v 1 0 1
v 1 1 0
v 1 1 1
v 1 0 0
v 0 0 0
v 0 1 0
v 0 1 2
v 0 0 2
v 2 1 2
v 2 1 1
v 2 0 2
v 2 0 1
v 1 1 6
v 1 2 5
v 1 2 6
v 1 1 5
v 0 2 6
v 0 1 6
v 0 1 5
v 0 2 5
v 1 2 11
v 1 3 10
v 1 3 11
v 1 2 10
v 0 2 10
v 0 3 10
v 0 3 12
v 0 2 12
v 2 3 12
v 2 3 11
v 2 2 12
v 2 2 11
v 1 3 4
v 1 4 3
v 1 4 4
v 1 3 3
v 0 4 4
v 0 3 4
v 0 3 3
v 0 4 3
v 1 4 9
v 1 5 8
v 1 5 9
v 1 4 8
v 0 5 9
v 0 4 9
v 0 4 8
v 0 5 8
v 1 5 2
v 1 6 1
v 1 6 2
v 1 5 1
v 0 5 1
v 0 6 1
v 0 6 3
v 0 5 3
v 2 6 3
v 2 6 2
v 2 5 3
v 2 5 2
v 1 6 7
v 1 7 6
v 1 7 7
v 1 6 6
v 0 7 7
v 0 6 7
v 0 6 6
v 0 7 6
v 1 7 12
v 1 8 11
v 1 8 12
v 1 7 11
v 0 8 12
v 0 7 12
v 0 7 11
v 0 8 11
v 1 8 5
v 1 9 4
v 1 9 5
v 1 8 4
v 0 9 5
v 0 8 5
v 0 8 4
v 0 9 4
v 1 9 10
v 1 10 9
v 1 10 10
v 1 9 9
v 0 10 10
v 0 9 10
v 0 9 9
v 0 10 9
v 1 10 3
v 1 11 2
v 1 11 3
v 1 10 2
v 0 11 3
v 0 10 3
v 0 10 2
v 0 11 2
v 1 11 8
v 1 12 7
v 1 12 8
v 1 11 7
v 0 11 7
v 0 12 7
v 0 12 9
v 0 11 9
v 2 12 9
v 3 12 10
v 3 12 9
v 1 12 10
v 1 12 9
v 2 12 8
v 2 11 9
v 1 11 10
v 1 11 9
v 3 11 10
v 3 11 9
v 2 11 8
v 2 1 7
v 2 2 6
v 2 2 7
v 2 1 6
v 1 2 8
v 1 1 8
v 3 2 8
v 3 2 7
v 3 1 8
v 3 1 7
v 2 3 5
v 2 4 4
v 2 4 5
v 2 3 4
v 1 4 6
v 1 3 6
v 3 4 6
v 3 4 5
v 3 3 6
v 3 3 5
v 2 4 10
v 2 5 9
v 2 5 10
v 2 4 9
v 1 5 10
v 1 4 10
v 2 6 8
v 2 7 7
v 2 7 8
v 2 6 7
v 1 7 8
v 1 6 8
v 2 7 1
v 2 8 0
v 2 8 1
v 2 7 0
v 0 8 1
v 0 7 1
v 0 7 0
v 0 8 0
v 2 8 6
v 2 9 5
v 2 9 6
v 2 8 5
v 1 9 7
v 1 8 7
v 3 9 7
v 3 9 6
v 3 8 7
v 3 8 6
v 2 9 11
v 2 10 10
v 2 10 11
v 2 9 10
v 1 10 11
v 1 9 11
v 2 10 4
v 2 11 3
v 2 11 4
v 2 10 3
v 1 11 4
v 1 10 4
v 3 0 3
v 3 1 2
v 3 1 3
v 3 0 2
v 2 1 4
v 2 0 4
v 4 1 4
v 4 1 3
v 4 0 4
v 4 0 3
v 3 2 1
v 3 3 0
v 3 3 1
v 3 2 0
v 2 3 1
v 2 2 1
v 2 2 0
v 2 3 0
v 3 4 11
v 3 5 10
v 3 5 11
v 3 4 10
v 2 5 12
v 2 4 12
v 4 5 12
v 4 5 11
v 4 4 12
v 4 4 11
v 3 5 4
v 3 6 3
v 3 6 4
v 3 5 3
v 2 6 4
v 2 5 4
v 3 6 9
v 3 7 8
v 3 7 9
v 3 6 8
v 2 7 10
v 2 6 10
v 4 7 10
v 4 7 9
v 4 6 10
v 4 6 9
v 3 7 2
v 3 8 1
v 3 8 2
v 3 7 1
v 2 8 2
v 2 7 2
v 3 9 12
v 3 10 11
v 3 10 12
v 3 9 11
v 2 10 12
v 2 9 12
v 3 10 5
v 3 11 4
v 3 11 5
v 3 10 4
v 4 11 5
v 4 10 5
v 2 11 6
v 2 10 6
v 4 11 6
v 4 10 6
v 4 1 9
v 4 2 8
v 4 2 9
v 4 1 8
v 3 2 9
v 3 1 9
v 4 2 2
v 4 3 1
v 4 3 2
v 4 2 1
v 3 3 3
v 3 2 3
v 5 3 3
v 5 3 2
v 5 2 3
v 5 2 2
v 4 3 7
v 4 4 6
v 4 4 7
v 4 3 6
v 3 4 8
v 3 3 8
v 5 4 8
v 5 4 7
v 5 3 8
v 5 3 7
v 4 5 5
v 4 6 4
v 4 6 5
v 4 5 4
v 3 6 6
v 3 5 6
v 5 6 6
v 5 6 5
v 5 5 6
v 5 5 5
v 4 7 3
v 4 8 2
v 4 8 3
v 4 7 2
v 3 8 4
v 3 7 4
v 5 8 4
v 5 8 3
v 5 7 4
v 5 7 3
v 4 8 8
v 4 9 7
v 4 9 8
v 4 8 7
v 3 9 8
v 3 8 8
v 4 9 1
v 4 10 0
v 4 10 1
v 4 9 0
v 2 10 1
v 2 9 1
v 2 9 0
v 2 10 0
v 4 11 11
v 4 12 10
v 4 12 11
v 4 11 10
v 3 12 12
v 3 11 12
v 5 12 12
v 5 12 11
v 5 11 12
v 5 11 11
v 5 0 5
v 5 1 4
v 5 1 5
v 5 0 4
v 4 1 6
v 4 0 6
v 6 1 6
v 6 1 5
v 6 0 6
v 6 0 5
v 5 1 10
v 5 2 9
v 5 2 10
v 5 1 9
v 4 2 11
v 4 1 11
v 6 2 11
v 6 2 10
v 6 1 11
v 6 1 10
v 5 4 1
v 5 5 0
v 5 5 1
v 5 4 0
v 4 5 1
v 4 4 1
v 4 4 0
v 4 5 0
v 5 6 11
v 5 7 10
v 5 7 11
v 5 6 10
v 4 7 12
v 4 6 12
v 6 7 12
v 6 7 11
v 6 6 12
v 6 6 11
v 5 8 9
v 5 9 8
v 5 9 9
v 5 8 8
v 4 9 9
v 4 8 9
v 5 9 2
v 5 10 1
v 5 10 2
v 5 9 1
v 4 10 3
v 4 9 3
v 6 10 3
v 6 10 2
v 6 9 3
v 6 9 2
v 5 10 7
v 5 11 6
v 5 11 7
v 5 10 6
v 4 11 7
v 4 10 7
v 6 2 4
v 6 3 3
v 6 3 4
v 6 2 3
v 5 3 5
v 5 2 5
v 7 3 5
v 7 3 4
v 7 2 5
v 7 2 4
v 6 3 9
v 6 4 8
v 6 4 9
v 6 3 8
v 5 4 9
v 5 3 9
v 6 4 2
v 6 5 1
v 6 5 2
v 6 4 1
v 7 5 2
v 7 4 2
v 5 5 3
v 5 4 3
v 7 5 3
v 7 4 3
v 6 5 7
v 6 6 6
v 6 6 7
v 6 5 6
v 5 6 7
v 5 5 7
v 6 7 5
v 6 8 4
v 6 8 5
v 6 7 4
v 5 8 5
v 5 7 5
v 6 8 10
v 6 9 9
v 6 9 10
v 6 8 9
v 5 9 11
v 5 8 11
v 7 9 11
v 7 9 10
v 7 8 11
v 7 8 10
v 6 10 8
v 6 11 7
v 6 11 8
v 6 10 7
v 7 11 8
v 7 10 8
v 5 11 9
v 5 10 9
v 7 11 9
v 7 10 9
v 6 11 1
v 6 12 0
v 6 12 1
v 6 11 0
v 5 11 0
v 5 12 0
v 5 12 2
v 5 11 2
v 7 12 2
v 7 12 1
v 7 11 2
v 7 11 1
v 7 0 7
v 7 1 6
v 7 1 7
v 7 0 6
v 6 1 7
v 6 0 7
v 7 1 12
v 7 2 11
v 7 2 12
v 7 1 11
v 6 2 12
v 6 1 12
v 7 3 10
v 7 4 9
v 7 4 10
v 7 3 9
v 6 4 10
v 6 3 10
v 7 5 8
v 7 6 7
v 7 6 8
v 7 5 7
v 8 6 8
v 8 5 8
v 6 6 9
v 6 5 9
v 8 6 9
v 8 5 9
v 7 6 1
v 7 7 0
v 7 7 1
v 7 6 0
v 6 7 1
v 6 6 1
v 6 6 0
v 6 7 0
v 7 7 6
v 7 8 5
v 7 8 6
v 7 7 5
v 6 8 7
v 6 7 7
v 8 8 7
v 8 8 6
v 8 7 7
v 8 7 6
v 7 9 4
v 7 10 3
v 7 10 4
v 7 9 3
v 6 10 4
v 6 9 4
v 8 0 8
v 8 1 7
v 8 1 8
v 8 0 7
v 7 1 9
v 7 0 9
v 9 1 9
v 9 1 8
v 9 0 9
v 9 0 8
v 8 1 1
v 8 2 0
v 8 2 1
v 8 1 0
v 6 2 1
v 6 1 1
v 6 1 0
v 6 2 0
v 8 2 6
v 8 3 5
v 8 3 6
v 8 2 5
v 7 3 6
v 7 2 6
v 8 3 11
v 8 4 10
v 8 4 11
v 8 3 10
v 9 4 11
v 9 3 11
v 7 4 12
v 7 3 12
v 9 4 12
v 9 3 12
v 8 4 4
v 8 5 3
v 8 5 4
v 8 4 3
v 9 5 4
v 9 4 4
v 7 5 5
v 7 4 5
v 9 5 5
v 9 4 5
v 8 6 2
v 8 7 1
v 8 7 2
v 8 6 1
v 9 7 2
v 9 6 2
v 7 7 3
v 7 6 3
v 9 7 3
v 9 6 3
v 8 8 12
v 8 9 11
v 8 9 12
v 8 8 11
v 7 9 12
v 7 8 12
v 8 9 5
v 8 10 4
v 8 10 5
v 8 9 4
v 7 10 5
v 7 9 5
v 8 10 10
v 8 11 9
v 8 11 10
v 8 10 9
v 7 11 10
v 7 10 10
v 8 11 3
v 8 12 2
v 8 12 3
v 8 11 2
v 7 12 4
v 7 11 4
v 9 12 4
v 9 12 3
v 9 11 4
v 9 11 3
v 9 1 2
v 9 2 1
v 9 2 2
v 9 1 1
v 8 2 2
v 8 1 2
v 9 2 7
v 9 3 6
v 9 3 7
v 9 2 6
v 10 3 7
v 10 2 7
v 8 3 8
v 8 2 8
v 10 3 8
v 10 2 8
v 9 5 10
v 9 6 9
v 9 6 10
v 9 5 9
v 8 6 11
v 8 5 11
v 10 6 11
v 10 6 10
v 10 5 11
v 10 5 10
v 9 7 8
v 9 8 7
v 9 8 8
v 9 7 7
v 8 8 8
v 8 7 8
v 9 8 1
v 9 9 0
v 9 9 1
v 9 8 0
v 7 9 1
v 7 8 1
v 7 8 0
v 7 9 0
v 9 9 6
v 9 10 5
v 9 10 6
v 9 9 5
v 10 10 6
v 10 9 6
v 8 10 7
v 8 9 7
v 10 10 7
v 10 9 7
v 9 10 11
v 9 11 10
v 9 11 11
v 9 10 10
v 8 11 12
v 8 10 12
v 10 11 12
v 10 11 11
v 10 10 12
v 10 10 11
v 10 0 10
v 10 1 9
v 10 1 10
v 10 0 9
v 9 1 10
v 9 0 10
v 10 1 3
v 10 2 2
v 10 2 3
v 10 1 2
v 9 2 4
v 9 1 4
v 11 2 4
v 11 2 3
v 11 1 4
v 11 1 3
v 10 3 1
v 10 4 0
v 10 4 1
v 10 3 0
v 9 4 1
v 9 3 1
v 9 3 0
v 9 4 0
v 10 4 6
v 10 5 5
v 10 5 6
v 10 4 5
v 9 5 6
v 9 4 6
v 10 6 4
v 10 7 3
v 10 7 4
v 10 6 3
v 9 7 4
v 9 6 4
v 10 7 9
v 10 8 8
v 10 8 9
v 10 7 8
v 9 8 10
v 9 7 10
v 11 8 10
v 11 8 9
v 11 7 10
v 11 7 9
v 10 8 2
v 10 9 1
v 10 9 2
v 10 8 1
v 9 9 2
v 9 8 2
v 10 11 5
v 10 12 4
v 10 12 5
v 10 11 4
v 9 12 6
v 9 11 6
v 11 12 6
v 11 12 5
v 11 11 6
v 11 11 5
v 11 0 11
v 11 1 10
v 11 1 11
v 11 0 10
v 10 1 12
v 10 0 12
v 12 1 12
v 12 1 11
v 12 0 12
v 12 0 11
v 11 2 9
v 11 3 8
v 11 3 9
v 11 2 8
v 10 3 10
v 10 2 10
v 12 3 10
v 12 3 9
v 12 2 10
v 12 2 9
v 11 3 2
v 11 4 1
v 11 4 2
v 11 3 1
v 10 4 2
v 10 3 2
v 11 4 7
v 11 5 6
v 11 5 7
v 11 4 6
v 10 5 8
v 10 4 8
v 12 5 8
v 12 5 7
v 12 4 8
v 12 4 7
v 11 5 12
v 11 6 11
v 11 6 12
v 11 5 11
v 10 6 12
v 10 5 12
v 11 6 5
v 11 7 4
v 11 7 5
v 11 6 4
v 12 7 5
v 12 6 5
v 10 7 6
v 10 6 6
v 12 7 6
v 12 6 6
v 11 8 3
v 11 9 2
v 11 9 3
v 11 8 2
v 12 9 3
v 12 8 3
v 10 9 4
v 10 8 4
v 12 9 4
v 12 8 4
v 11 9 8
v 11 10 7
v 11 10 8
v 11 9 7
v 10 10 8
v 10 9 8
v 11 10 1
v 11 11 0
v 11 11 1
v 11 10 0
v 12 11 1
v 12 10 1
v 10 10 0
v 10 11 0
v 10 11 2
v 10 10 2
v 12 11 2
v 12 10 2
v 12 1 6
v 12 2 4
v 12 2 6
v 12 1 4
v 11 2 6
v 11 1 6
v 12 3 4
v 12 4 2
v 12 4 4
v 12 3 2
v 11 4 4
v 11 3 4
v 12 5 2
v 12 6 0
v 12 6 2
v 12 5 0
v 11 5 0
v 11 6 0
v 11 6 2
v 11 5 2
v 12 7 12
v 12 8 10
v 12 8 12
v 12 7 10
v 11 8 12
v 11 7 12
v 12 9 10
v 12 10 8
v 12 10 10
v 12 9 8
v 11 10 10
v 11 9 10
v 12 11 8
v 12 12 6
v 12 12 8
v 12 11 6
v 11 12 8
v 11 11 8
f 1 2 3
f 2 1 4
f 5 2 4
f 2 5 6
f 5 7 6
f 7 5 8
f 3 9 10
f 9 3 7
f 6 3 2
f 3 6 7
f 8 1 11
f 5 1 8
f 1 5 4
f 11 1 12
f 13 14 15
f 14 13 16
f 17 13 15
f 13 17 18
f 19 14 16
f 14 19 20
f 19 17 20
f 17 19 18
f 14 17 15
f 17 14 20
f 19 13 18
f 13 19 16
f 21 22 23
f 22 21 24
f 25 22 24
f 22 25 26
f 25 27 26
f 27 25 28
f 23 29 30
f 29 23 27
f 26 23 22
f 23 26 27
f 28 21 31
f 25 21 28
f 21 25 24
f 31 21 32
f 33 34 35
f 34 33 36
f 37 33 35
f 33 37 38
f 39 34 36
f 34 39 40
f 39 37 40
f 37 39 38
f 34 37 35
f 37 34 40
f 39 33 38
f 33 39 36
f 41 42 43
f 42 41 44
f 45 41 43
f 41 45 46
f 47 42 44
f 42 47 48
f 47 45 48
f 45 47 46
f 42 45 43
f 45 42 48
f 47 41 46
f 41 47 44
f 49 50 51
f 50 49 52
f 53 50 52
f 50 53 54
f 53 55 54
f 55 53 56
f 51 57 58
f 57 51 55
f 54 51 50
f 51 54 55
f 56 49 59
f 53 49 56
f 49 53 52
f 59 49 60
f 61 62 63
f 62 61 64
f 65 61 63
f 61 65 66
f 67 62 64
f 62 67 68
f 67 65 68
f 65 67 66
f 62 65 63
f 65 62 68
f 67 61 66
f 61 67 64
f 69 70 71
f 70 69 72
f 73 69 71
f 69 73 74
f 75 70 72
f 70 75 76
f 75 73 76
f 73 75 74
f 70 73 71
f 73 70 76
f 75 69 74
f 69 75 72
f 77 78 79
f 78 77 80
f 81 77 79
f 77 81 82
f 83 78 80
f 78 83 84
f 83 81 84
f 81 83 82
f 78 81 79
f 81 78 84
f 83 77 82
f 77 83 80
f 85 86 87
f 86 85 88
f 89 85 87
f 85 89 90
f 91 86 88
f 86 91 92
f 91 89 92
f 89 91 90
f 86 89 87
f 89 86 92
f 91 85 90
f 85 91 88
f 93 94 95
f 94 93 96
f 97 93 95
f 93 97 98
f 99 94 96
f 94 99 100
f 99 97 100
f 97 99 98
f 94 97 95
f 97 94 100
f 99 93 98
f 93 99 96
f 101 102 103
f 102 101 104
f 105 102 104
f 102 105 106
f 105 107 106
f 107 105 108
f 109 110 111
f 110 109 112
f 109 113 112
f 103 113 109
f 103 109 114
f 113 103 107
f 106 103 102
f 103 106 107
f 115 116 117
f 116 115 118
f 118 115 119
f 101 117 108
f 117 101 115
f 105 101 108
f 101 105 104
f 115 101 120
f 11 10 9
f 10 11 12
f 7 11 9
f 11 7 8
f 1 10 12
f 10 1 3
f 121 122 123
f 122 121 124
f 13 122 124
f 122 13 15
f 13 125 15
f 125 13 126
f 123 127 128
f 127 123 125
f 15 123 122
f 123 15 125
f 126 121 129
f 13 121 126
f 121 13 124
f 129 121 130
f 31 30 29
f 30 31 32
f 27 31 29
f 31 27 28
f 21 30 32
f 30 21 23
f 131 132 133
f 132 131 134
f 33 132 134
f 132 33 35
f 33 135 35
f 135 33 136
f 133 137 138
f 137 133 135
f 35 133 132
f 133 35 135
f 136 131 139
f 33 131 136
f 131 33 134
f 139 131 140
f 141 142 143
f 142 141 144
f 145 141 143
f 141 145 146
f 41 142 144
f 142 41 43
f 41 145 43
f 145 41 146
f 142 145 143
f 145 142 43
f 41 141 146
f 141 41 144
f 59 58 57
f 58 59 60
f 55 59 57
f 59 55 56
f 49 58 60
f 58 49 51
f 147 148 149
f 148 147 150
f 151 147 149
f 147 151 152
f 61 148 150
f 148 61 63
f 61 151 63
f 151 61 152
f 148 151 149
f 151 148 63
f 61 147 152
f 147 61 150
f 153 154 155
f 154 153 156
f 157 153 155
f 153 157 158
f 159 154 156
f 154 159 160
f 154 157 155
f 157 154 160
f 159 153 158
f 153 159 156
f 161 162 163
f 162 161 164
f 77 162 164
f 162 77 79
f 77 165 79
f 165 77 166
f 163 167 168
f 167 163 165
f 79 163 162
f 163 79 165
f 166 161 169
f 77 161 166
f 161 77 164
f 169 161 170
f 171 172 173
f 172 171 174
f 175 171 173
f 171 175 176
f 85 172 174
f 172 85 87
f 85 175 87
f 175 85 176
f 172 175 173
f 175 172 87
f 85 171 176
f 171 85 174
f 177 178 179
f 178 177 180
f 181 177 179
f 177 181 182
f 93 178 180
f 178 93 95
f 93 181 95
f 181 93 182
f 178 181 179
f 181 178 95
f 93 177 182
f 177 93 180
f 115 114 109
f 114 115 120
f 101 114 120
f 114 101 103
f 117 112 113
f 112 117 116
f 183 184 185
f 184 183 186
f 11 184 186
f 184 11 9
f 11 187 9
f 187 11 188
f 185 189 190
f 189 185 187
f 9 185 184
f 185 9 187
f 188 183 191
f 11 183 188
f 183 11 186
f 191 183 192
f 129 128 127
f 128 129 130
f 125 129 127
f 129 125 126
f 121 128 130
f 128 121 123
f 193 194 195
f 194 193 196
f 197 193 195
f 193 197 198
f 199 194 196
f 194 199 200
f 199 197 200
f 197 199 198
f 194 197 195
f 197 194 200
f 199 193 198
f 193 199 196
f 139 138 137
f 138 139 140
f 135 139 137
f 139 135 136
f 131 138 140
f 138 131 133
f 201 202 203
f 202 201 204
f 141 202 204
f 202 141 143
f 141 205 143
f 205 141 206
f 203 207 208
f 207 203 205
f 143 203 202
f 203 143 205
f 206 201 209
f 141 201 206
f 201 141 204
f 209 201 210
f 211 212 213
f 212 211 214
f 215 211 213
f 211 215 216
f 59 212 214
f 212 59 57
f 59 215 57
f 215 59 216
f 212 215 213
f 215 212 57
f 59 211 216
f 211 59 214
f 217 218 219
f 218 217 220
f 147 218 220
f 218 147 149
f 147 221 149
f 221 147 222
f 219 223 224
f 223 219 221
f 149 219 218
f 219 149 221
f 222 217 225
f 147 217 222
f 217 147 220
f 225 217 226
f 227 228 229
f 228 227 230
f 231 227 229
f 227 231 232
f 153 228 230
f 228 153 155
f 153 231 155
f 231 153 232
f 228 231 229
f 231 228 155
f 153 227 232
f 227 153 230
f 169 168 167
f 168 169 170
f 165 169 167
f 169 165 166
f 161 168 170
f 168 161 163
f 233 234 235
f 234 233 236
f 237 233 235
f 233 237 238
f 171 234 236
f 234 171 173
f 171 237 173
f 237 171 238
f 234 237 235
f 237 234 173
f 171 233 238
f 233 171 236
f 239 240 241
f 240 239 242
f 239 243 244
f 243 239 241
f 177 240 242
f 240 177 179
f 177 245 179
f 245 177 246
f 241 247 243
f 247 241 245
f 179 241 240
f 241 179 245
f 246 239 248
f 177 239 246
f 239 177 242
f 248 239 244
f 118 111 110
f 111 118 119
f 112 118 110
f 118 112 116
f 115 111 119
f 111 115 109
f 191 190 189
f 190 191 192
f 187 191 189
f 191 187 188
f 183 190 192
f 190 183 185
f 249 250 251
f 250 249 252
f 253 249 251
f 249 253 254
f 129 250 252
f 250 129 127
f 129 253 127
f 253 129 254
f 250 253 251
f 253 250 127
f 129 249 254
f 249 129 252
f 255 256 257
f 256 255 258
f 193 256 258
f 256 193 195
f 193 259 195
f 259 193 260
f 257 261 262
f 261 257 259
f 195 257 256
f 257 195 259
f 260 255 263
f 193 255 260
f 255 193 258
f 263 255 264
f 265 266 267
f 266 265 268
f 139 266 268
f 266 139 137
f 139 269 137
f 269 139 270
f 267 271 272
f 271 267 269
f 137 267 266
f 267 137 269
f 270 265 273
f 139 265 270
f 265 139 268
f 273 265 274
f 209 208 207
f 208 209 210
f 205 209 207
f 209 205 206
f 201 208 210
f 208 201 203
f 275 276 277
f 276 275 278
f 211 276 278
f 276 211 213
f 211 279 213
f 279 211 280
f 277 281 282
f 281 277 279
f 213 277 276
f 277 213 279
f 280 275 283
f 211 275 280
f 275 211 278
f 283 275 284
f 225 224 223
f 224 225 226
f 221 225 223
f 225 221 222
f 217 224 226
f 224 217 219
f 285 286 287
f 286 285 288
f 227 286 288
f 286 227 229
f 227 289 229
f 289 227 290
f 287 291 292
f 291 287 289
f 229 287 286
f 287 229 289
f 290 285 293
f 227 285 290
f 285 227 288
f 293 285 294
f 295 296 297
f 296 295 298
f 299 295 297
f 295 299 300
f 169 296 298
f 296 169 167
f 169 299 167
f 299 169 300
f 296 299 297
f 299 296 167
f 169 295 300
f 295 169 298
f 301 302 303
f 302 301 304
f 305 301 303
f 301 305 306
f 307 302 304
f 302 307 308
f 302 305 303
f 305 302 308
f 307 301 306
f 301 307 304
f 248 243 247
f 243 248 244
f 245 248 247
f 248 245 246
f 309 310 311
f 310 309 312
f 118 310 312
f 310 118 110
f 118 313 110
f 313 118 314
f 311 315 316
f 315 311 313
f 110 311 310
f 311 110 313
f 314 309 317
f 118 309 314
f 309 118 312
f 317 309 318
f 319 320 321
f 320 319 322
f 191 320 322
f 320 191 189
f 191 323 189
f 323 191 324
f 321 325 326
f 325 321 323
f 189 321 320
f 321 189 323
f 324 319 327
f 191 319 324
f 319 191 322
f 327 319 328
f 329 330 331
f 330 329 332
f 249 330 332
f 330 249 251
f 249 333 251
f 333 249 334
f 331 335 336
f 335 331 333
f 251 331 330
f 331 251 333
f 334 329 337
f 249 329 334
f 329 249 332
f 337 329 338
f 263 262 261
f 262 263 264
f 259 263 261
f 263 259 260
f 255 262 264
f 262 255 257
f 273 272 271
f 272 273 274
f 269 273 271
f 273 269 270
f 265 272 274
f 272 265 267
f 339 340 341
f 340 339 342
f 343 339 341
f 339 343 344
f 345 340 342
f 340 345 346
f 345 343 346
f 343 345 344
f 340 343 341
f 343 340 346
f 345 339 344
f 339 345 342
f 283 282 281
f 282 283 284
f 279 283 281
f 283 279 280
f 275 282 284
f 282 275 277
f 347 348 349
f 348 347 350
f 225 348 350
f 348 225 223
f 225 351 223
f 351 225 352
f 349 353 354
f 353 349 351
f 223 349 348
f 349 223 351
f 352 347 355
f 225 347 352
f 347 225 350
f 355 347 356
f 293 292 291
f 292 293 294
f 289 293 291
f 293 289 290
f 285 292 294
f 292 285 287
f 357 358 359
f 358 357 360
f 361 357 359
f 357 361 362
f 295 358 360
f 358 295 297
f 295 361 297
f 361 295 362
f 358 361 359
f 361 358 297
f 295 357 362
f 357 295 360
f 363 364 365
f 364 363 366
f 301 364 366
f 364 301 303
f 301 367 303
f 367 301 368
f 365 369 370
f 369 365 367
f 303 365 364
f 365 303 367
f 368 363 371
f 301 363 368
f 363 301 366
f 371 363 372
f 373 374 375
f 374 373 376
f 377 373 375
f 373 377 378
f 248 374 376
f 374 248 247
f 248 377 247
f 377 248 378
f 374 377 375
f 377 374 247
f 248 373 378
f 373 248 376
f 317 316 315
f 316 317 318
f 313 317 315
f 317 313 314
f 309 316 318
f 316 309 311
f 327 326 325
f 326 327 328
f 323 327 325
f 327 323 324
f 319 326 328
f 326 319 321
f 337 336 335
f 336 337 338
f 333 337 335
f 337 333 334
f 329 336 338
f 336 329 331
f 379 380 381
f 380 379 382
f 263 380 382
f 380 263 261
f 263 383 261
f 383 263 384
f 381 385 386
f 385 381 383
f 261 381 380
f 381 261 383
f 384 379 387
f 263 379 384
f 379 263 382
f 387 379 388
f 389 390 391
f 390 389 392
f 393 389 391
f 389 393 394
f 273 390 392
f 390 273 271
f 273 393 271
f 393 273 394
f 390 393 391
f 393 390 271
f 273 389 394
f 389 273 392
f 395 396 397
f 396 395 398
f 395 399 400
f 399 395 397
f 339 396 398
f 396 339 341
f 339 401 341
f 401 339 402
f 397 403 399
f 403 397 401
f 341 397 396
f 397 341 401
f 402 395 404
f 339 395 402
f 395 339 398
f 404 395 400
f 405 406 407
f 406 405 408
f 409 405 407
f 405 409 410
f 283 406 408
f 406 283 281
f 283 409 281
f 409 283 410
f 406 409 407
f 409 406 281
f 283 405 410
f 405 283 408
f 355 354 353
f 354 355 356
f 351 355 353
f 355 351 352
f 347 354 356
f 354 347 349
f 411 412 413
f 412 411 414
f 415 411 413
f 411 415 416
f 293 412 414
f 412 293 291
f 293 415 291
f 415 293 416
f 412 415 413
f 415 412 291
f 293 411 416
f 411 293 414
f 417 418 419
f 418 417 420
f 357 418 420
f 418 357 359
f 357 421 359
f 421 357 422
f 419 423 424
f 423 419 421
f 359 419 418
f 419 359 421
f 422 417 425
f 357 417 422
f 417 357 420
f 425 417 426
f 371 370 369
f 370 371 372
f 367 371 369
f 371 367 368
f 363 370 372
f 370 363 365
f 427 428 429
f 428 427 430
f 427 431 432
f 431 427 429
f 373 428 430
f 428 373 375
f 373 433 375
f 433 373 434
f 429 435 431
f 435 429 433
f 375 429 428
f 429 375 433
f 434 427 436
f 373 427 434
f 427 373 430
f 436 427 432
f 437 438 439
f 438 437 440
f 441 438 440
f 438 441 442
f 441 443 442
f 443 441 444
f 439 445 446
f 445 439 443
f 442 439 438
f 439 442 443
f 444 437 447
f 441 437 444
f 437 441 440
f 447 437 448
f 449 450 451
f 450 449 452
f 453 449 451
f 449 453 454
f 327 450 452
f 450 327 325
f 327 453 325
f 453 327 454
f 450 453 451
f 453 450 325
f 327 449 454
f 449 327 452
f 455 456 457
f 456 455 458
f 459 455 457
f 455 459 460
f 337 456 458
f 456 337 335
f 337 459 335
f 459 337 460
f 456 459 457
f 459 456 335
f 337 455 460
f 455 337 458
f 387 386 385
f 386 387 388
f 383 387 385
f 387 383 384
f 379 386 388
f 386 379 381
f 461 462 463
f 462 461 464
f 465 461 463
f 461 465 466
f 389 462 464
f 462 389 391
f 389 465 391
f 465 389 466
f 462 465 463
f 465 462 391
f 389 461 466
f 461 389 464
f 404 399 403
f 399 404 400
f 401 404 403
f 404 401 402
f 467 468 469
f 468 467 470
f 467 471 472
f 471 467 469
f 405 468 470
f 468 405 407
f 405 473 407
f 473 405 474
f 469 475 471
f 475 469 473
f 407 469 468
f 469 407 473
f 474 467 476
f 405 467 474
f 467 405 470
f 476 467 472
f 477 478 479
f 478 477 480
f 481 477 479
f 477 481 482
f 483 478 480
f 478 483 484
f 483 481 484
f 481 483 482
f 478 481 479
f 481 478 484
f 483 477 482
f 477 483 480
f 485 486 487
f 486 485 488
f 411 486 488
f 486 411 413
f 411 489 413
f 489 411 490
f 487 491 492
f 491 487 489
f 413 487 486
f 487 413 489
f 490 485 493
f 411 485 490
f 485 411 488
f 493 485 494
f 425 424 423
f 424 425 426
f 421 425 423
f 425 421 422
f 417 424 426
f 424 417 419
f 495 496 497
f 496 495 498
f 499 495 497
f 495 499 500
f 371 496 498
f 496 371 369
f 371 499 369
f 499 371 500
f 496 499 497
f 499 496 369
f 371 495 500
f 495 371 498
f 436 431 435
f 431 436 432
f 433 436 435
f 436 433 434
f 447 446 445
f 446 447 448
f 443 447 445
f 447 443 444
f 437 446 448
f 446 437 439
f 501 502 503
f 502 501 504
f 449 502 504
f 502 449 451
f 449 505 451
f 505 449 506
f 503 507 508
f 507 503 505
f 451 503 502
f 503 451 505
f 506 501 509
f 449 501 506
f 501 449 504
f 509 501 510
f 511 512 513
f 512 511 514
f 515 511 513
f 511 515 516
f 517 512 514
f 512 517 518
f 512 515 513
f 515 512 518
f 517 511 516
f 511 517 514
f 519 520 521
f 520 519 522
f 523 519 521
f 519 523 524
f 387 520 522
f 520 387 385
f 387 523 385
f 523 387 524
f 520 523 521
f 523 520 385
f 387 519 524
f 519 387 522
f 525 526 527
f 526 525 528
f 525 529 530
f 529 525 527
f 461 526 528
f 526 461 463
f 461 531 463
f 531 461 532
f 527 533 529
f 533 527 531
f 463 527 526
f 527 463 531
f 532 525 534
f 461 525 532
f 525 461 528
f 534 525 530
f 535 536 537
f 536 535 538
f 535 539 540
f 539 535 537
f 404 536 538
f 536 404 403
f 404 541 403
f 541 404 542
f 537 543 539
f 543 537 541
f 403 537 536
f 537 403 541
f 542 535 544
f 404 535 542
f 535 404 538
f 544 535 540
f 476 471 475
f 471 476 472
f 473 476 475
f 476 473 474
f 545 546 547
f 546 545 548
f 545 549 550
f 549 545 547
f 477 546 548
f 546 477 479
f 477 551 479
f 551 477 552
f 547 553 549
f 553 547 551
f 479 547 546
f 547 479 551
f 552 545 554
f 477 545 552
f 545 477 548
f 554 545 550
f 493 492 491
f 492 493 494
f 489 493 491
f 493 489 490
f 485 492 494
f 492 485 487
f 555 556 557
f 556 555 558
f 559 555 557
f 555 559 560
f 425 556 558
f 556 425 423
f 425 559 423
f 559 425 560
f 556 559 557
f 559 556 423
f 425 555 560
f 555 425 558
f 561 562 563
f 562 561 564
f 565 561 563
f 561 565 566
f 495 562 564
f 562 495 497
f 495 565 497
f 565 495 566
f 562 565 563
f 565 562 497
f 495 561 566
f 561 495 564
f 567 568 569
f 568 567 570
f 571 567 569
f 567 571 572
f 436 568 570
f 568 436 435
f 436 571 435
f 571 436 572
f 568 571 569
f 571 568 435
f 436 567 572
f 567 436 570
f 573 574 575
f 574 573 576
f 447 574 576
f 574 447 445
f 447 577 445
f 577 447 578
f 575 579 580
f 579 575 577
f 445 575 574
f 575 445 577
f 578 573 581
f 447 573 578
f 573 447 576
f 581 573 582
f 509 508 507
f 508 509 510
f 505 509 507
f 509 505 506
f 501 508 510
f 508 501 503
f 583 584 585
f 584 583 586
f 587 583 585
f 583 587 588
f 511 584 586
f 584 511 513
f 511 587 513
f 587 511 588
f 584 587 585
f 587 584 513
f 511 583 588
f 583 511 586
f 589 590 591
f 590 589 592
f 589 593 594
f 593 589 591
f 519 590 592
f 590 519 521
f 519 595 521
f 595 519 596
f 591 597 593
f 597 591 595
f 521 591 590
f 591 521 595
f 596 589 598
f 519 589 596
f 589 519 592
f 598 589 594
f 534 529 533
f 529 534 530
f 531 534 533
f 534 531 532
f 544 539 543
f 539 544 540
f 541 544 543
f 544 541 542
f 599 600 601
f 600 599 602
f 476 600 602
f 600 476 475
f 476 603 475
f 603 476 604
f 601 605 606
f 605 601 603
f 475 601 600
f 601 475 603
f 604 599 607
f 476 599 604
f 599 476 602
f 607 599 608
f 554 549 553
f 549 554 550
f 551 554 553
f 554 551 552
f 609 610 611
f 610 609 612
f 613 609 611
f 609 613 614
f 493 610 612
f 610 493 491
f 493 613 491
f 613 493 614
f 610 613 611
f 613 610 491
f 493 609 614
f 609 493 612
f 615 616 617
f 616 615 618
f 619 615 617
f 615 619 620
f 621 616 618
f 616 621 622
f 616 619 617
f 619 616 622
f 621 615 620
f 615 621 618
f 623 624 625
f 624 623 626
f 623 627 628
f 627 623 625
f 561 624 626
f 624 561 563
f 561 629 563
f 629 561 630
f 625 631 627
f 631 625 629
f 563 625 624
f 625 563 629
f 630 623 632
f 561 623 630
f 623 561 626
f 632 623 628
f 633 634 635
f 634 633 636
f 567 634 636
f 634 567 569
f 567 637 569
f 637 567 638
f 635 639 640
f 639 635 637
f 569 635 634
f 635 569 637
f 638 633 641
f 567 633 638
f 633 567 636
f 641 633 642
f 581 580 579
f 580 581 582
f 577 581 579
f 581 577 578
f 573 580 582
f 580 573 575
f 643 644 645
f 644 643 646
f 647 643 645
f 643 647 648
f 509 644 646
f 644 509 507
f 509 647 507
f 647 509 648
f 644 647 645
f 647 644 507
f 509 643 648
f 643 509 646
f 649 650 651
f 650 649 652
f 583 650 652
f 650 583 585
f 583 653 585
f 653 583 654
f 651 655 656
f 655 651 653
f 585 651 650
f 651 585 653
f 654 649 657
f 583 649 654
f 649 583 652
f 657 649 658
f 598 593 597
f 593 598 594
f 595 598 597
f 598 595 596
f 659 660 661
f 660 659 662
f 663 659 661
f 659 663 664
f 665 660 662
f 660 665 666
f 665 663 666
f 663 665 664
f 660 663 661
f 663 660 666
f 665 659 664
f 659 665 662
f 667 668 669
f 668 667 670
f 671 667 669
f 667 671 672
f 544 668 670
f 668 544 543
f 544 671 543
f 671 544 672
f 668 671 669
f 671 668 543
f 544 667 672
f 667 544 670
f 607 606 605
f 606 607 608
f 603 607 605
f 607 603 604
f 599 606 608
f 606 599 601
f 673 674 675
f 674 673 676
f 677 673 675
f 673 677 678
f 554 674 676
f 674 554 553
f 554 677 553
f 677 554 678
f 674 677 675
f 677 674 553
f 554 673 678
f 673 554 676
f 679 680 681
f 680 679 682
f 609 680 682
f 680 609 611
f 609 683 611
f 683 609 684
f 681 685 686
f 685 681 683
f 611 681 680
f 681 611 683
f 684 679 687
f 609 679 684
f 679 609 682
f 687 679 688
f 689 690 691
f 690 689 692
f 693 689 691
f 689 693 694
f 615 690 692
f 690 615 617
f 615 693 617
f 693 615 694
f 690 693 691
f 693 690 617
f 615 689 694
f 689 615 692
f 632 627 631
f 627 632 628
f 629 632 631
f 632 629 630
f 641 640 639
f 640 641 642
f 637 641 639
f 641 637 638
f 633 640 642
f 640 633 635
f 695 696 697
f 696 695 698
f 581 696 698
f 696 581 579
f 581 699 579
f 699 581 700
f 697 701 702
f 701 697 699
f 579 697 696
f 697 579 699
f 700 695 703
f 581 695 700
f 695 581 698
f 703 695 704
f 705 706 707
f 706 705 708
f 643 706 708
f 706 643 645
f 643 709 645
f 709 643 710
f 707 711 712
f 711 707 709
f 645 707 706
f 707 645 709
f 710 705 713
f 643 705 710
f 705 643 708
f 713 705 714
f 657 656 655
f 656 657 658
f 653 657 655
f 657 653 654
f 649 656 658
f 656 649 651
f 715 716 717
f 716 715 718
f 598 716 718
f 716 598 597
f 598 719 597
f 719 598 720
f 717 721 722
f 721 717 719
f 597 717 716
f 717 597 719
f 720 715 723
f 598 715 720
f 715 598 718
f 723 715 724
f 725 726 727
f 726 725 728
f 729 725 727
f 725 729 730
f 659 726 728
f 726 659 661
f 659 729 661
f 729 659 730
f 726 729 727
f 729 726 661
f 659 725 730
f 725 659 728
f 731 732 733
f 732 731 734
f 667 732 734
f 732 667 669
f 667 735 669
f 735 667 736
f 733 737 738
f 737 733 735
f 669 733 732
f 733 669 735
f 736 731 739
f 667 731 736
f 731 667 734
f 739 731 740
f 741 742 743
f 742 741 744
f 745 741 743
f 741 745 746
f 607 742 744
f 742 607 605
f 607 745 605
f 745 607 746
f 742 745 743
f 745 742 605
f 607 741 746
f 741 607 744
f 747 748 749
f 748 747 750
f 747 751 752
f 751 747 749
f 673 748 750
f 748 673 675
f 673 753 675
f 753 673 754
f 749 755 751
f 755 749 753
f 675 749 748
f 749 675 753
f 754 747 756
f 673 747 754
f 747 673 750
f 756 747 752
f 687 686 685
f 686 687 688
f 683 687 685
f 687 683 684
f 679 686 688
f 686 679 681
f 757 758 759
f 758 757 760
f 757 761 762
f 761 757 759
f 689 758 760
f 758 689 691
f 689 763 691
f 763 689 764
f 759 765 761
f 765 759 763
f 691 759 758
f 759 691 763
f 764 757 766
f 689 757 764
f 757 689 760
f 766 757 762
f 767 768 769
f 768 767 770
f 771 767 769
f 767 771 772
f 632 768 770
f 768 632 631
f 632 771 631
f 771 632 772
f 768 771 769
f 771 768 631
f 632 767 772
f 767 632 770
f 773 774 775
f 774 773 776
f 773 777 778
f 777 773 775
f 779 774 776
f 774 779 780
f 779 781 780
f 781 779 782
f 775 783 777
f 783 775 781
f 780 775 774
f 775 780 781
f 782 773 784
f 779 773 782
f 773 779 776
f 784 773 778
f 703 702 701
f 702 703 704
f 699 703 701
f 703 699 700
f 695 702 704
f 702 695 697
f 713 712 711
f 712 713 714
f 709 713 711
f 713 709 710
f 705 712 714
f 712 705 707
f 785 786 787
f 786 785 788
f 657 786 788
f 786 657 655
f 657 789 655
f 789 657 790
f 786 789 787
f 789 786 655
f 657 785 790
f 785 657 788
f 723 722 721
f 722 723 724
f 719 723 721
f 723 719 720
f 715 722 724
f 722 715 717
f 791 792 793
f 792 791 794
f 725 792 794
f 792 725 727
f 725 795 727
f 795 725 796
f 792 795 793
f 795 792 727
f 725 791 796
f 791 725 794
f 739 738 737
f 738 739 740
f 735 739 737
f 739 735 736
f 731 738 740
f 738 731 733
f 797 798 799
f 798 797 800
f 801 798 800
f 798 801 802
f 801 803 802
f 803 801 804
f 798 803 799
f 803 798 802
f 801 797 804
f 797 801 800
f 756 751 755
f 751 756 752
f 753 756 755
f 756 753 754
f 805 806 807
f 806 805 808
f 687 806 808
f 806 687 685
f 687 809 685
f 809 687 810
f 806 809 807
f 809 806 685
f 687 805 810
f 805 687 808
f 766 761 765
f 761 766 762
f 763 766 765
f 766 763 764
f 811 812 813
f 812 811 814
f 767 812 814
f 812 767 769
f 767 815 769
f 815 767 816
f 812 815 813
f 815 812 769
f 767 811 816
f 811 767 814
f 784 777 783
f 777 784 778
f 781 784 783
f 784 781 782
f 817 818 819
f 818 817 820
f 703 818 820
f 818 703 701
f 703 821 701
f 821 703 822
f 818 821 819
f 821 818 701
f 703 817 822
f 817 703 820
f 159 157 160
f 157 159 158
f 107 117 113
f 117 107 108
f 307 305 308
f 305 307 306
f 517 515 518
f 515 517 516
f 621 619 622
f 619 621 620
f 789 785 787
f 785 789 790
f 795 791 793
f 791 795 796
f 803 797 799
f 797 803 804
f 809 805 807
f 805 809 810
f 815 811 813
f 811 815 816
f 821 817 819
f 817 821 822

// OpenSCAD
union() {
    translate([0, 0, 0]) cube([1, 1, 1]);
    translate([0, 1, 5]) cube([1, 1, 1]);
    translate([0, 2, 10]) cube([1, 1, 1]);
    translate([0, 3, 3]) cube([1, 1, 1]);
    translate([0, 4, 8]) cube([1, 1, 1]);
    translate([0, 5, 1]) cube([1, 1, 1]);
    translate([0, 6, 6]) cube([1, 1, 1]);
    translate([0, 7, 11]) cube([1, 1, 1]);
    translate([0, 8, 4]) cube([1, 1, 1]);
    translate([0, 9, 9]) cube([1, 1, 1]);
    translate([0, 10, 2]) cube([1, 1, 1]);
    translate([0, 11, 7]) cube([1, 1, 1]);
    translate([1, 0, 1]) cube([1, 1, 1]);
    translate([1, 1, 6]) cube([1, 1, 1]);
    translate([1, 2, 11]) cube([1, 1, 1]);
    translate([1, 3, 4]) cube([1, 1, 1]);
    translate([1, 4, 9]) cube([1, 1, 1]);
    translate([1, 5, 2]) cube([1, 1, 1]);
    translate([1, 6, 7]) cube([1, 1, 1]);
    translate([1, 7, 0]) cube([1, 1, 1]);
    translate([1, 8, 5]) cube([1, 1, 1]);
    translate([1, 9, 10]) cube([1, 1, 1]);
    translate([1, 10, 3]) cube([1, 1, 1]);
    translate([1, 11, 8]) cube([1, 1, 1]);
    translate([2, 0, 2]) cube([1, 1, 1]);
    translate([2, 1, 7]) cube([1, 1, 1]);
    translate([2, 2, 0]) cube([1, 1, 1]);
    translate([2, 3, 5]) cube([1, 1, 1]);
    translate([2, 4, 10]) cube([1, 1, 1]);
    translate([2, 5, 3]) cube([1, 1, 1]);
    translate([2, 6, 8]) cube([1, 1, 1]);
    translate([2, 7, 1]) cube([1, 1, 1]);
    translate([2, 8, 6]) cube([1, 1, 1]);
    translate([2, 9, 11]) cube([1, 1, 1]);
    translate([2, 10, 4]) cube([1, 1, 1]);
    translate([2, 11, 9]) cube([1, 1, 1]);
    translate([3, 0, 3]) cube([1, 1, 1]);
    translate([3, 1, 8]) cube([1, 1, 1]);
    translate([3, 2, 1]) cube([1, 1, 1]);
    translate([3, 3, 6]) cube([1, 1, 1]);
    translate([3, 4, 11]) cube([1, 1, 1]);
    translate([3, 5, 4]) cube([1, 1, 1]);
    translate([3, 6, 9]) cube([1, 1, 1]);
    translate([3, 7, 2]) cube([1, 1, 1]);
    translate([3, 8, 7]) cube([1, 1, 1]);
    translate([3, 9, 0]) cube([1, 1, 1]);
    translate([3, 10, 5]) cube([1, 1, 1]);
    translate([3, 11, 10]) cube([1, 1, 1]);
    translate([4, 0, 4]) cube([1, 1, 1]);
    translate([4, 1, 9]) cube([1, 1, 1]);
    translate([4, 2, 2]) cube([1, 1, 1]);
    translate([4, 3, 7]) cube([1, 1, 1]);
    translate([4, 4, 0]) cube([1, 1, 1]);
    translate([4, 5, 5]) cube([1, 1, 1]);
    translate([4, 6, 10]) cube([1, 1, 1]);
    translate([4, 7, 3]) cube([1, 1, 1]);
    translate([4, 8, 8]) cube([1, 1, 1]);
    translate([4, 9, 1]) cube([1, 1, 1]);
    translate([4, 10, 6]) cube([1, 1, 1]);
    translate([4, 11, 11]) cube([1, 1, 1]);
    translate([5, 0, 5]) cube([1, 1, 1]);
    translate([5, 1, 10]) cube([1, 1, 1]);
    translate([5, 2, 3]) cube([1, 1, 1]);
    translate([5, 3, 8]) cube([1, 1, 1]);
    translate([5, 4, 1]) cube([1, 1, 1]);
    translate([5, 5, 6]) cube([1, 1, 1]);
    translate([5, 6, 11]) cube([1, 1, 1]);
    translate([5, 7, 4]) cube([1, 1, 1]);
    translate([5, 8, 9]) cube([1, 1, 1]);
    translate([5, 9, 2]) cube([1, 1, 1]);
    translate([5, 10, 7]) cube([1, 1, 1]);
    translate([5, 11, 0]) cube([1, 1, 1]);
    translate([6, 0, 6]) cube([1, 1, 1]);
    translate([6, 1, 11]) cube([1, 1, 1]);
    translate([6, 2, 4]) cube([1, 1, 1]);
    translate([6, 3, 9]) cube([1, 1, 1]);
    translate([6, 4, 2]) cube([1, 1, 1]);
    translate([6, 5, 7]) cube([1, 1, 1]);
    translate([6, 6, 0]) cube([1, 1, 1]);
    translate([6, 7, 5]) cube([1, 1, 1]);
    translate([6, 8, 10]) cube([1, 1, 1]);
    translate([6, 9, 3]) cube([1, 1, 1]);
    translate([6, 10, 8]) cube([1, 1, 1]);
    translate([6, 11, 1]) cube([1, 1, 1]);
    translate([7, 0, 7]) cube([1, 1, 1]);
    translate([7, 1, 0]) cube([1, 1, 1]);
    translate([7, 2, 5]) cube([1, 1, 1]);
    translate([7, 3, 10]) cube([1, 1, 1]);
    translate([7, 4, 3]) cube([1, 1, 1]);
    translate([7, 5, 8]) cube([1, 1, 1]);
    translate([7, 6, 1]) cube([1, 1, 1]);
    translate([7, 7, 6]) cube([1, 1, 1]);
    translate([7, 8, 11]) cube([1, 1, 1]);
    translate([7, 9, 4]) cube([1, 1, 1]);
    translate([7, 10, 9]) cube([1, 1, 1]);
    translate([7, 11, 2]) cube([1, 1, 1]);
    translate([8, 0, 8]) cube([1, 1, 1]);
    translate([8, 1, 1]) cube([1, 1, 1]);
    translate([8, 2, 6]) cube([1, 1, 1]);
    translate([8, 3, 11]) cube([1, 1, 1]);
    translate([8, 4, 4]) cube([1, 1, 1]);
    translate([8, 5, 9]) cube([1, 1, 1]);
    translate([8, 6, 2]) cube([1, 1, 1]);
    translate([8, 7, 7]) cube([1, 1, 1]);
    translate([8, 8, 0]) cube([1, 1, 1]);
    translate([8, 9, 5]) cube([1, 1, 1]);
    translate([8, 10, 10]) cube([1, 1, 1]);
    translate([8, 11, 3]) cube([1, 1, 1]);
    translate([9, 0, 9]) cube([1, 1, 1]);
    translate([9, 1, 2]) cube([1, 1, 1]);
    translate([9, 2, 7]) cube([1, 1, 1]);
    translate([9, 3, 0]) cube([1, 1, 1]);
    translate([9, 4, 5]) cube([1, 1, 1]);
    translate([9, 5, 10]) cube([1, 1, 1]);
    translate([9, 6, 3]) cube([1, 1, 1]);
    translate([9, 7, 8]) cube([1, 1, 1]);
    translate([9, 8, 1]) cube([1, 1, 1]);
    translate([9, 9, 6]) cube([1, 1, 1]);
    translate([9, 10, 11]) cube([1, 1, 1]);
    translate([9, 11, 4]) cube([1, 1, 1]);
    translate([10, 0, 10]) cube([1, 1, 1]);
    translate([10, 1, 3]) cube([1, 1, 1]);
    translate([10, 2, 8]) cube([1, 1, 1]);
    translate([10, 3, 1]) cube([1, 1, 1]);
    translate([10, 4, 6]) cube([1, 1, 1]);
    translate([10, 5, 11]) cube([1, 1, 1]);
    translate([10, 6, 4]) cube([1, 1, 1]);
    translate([10, 7, 9]) cube([1, 1, 1]);
    translate([10, 8, 2]) cube([1, 1, 1]);
    translate([10, 9, 7]) cube([1, 1, 1]);
    translate([10, 10, 0]) cube([1, 1, 1]);
    translate([10, 11, 5]) cube([1, 1, 1]);
    translate([11, 0, 11]) cube([1, 1, 1]);
    translate([11, 1, 4]) cube([1, 1, 1]);
    translate([11, 2, 9]) cube([1, 1, 1]);
    translate([11, 3, 2]) cube([1, 1, 1]);
    translate([11, 4, 7]) cube([1, 1, 1]);
    translate([11, 5, 0]) cube([1, 1, 1]);
    translate([11, 6, 5]) cube([1, 1, 1]);
    translate([11, 7, 10]) cube([1, 1, 1]);
    translate([11, 8, 3]) cube([1, 1, 1]);
    translate([11, 9, 8]) cube([1, 1, 1]);
    translate([11, 10, 1]) cube([1, 1, 1]);
    translate([11, 11, 6]) cube([1, 1, 1]);
    translate([0, 0, 1]) cube([1, 1, 1]);
    translate([0, 2, 11]) cube([1, 1, 1]);
    translate([0, 5, 2]) cube([1, 1, 1]);
    translate([0, 7, 0]) cube([1, 1, 1]);
    translate([0, 11, 8]) cube([1, 1, 1]);
    translate([1, 1, 7]) cube([1, 1, 1]);
    translate([1, 3, 5]) cube([1, 1, 1]);
    translate([1, 8, 6]) cube([1, 1, 1]);
    translate([1, 11, 9]) cube([1, 1, 1]);
    translate([2, 0, 3]) cube([1, 1, 1]);
    translate([2, 4, 11]) cube([1, 1, 1]);
    translate([2, 6, 9]) cube([1, 1, 1]);
    translate([2, 9, 0]) cube([1, 1, 1]);
    translate([2, 10, 5]) cube([1, 1, 1]);
    translate([3, 2, 2]) cube([1, 1, 1]);
    translate([3, 5, 5]) cube([1, 1, 1]);
    translate([3, 7, 3]) cube([1, 1, 1]);
    translate([3, 11, 11]) cube([1, 1, 1]);
    translate([3, 3, 7]) cube([1, 1, 1]);
    translate([4, 0, 5]) cube([1, 1, 1]);
    translate([4, 1, 10]) cube([1, 1, 1]);
    translate([4, 6, 11]) cube([1, 1, 1]);
    translate([4, 9, 2]) cube([1, 1, 1]);
    translate([5, 2, 4]) cube([1, 1, 1]);
    translate([5, 4, 2]) cube([1, 1, 1]);
    translate([5, 8, 10]) cube([1, 1, 1]);
    translate([5, 10, 8]) cube([1, 1, 1]);
    translate([5, 11, 1]) cube([1, 1, 1]);
    translate([6, 1, 0]) cube([1, 1, 1]);
    translate([6, 5, 8]) cube([1, 1, 1]);
    translate([6, 7, 6]) cube([1, 1, 1]);
    translate([7, 0, 8]) cube([1, 1, 1]);
    translate([7, 3, 11]) cube([1, 1, 1]);
    translate([7, 4, 4]) cube([1, 1, 1]);
    translate([7, 6, 2]) cube([1, 1, 1]);
    translate([7, 8, 0]) cube([1, 1, 1]);
    translate([7, 11, 3]) cube([1, 1, 1]);
    translate([8, 2, 7]) cube([1, 1, 1]);
    translate([8, 5, 10]) cube([1, 1, 1]);
    translate([8, 9, 6]) cube([1, 1, 1]);
    translate([8, 10, 11]) cube([1, 1, 1]);
    translate([9, 1, 3]) cube([1, 1, 1]);
    translate([9, 7, 9]) cube([1, 1, 1]);
    translate([9, 11, 5]) cube([1, 1, 1]);
    translate([10, 0, 11]) cube([1, 1, 1]);
    translate([10, 2, 9]) cube([1, 1, 1]);
    translate([10, 4, 7]) cube([1, 1, 1]);
    translate([10, 6, 5]) cube([1, 1, 1]);
    translate([10, 8, 3]) cube([1, 1, 1]);
    translate([10, 10, 1]) cube([1, 1, 1]);
    translate([11, 1, 5]) cube([1, 1, 1]);
    translate([11, 3, 3]) cube([1, 1, 1]);
    translate([11, 5, 1]) cube([1, 1, 1]);
    translate([11, 7, 11]) cube([1, 1, 1]);
    translate([11, 9, 9]) cube([1, 1, 1]);
    translate([11, 11, 7]) cube([1, 1, 1]);
}
